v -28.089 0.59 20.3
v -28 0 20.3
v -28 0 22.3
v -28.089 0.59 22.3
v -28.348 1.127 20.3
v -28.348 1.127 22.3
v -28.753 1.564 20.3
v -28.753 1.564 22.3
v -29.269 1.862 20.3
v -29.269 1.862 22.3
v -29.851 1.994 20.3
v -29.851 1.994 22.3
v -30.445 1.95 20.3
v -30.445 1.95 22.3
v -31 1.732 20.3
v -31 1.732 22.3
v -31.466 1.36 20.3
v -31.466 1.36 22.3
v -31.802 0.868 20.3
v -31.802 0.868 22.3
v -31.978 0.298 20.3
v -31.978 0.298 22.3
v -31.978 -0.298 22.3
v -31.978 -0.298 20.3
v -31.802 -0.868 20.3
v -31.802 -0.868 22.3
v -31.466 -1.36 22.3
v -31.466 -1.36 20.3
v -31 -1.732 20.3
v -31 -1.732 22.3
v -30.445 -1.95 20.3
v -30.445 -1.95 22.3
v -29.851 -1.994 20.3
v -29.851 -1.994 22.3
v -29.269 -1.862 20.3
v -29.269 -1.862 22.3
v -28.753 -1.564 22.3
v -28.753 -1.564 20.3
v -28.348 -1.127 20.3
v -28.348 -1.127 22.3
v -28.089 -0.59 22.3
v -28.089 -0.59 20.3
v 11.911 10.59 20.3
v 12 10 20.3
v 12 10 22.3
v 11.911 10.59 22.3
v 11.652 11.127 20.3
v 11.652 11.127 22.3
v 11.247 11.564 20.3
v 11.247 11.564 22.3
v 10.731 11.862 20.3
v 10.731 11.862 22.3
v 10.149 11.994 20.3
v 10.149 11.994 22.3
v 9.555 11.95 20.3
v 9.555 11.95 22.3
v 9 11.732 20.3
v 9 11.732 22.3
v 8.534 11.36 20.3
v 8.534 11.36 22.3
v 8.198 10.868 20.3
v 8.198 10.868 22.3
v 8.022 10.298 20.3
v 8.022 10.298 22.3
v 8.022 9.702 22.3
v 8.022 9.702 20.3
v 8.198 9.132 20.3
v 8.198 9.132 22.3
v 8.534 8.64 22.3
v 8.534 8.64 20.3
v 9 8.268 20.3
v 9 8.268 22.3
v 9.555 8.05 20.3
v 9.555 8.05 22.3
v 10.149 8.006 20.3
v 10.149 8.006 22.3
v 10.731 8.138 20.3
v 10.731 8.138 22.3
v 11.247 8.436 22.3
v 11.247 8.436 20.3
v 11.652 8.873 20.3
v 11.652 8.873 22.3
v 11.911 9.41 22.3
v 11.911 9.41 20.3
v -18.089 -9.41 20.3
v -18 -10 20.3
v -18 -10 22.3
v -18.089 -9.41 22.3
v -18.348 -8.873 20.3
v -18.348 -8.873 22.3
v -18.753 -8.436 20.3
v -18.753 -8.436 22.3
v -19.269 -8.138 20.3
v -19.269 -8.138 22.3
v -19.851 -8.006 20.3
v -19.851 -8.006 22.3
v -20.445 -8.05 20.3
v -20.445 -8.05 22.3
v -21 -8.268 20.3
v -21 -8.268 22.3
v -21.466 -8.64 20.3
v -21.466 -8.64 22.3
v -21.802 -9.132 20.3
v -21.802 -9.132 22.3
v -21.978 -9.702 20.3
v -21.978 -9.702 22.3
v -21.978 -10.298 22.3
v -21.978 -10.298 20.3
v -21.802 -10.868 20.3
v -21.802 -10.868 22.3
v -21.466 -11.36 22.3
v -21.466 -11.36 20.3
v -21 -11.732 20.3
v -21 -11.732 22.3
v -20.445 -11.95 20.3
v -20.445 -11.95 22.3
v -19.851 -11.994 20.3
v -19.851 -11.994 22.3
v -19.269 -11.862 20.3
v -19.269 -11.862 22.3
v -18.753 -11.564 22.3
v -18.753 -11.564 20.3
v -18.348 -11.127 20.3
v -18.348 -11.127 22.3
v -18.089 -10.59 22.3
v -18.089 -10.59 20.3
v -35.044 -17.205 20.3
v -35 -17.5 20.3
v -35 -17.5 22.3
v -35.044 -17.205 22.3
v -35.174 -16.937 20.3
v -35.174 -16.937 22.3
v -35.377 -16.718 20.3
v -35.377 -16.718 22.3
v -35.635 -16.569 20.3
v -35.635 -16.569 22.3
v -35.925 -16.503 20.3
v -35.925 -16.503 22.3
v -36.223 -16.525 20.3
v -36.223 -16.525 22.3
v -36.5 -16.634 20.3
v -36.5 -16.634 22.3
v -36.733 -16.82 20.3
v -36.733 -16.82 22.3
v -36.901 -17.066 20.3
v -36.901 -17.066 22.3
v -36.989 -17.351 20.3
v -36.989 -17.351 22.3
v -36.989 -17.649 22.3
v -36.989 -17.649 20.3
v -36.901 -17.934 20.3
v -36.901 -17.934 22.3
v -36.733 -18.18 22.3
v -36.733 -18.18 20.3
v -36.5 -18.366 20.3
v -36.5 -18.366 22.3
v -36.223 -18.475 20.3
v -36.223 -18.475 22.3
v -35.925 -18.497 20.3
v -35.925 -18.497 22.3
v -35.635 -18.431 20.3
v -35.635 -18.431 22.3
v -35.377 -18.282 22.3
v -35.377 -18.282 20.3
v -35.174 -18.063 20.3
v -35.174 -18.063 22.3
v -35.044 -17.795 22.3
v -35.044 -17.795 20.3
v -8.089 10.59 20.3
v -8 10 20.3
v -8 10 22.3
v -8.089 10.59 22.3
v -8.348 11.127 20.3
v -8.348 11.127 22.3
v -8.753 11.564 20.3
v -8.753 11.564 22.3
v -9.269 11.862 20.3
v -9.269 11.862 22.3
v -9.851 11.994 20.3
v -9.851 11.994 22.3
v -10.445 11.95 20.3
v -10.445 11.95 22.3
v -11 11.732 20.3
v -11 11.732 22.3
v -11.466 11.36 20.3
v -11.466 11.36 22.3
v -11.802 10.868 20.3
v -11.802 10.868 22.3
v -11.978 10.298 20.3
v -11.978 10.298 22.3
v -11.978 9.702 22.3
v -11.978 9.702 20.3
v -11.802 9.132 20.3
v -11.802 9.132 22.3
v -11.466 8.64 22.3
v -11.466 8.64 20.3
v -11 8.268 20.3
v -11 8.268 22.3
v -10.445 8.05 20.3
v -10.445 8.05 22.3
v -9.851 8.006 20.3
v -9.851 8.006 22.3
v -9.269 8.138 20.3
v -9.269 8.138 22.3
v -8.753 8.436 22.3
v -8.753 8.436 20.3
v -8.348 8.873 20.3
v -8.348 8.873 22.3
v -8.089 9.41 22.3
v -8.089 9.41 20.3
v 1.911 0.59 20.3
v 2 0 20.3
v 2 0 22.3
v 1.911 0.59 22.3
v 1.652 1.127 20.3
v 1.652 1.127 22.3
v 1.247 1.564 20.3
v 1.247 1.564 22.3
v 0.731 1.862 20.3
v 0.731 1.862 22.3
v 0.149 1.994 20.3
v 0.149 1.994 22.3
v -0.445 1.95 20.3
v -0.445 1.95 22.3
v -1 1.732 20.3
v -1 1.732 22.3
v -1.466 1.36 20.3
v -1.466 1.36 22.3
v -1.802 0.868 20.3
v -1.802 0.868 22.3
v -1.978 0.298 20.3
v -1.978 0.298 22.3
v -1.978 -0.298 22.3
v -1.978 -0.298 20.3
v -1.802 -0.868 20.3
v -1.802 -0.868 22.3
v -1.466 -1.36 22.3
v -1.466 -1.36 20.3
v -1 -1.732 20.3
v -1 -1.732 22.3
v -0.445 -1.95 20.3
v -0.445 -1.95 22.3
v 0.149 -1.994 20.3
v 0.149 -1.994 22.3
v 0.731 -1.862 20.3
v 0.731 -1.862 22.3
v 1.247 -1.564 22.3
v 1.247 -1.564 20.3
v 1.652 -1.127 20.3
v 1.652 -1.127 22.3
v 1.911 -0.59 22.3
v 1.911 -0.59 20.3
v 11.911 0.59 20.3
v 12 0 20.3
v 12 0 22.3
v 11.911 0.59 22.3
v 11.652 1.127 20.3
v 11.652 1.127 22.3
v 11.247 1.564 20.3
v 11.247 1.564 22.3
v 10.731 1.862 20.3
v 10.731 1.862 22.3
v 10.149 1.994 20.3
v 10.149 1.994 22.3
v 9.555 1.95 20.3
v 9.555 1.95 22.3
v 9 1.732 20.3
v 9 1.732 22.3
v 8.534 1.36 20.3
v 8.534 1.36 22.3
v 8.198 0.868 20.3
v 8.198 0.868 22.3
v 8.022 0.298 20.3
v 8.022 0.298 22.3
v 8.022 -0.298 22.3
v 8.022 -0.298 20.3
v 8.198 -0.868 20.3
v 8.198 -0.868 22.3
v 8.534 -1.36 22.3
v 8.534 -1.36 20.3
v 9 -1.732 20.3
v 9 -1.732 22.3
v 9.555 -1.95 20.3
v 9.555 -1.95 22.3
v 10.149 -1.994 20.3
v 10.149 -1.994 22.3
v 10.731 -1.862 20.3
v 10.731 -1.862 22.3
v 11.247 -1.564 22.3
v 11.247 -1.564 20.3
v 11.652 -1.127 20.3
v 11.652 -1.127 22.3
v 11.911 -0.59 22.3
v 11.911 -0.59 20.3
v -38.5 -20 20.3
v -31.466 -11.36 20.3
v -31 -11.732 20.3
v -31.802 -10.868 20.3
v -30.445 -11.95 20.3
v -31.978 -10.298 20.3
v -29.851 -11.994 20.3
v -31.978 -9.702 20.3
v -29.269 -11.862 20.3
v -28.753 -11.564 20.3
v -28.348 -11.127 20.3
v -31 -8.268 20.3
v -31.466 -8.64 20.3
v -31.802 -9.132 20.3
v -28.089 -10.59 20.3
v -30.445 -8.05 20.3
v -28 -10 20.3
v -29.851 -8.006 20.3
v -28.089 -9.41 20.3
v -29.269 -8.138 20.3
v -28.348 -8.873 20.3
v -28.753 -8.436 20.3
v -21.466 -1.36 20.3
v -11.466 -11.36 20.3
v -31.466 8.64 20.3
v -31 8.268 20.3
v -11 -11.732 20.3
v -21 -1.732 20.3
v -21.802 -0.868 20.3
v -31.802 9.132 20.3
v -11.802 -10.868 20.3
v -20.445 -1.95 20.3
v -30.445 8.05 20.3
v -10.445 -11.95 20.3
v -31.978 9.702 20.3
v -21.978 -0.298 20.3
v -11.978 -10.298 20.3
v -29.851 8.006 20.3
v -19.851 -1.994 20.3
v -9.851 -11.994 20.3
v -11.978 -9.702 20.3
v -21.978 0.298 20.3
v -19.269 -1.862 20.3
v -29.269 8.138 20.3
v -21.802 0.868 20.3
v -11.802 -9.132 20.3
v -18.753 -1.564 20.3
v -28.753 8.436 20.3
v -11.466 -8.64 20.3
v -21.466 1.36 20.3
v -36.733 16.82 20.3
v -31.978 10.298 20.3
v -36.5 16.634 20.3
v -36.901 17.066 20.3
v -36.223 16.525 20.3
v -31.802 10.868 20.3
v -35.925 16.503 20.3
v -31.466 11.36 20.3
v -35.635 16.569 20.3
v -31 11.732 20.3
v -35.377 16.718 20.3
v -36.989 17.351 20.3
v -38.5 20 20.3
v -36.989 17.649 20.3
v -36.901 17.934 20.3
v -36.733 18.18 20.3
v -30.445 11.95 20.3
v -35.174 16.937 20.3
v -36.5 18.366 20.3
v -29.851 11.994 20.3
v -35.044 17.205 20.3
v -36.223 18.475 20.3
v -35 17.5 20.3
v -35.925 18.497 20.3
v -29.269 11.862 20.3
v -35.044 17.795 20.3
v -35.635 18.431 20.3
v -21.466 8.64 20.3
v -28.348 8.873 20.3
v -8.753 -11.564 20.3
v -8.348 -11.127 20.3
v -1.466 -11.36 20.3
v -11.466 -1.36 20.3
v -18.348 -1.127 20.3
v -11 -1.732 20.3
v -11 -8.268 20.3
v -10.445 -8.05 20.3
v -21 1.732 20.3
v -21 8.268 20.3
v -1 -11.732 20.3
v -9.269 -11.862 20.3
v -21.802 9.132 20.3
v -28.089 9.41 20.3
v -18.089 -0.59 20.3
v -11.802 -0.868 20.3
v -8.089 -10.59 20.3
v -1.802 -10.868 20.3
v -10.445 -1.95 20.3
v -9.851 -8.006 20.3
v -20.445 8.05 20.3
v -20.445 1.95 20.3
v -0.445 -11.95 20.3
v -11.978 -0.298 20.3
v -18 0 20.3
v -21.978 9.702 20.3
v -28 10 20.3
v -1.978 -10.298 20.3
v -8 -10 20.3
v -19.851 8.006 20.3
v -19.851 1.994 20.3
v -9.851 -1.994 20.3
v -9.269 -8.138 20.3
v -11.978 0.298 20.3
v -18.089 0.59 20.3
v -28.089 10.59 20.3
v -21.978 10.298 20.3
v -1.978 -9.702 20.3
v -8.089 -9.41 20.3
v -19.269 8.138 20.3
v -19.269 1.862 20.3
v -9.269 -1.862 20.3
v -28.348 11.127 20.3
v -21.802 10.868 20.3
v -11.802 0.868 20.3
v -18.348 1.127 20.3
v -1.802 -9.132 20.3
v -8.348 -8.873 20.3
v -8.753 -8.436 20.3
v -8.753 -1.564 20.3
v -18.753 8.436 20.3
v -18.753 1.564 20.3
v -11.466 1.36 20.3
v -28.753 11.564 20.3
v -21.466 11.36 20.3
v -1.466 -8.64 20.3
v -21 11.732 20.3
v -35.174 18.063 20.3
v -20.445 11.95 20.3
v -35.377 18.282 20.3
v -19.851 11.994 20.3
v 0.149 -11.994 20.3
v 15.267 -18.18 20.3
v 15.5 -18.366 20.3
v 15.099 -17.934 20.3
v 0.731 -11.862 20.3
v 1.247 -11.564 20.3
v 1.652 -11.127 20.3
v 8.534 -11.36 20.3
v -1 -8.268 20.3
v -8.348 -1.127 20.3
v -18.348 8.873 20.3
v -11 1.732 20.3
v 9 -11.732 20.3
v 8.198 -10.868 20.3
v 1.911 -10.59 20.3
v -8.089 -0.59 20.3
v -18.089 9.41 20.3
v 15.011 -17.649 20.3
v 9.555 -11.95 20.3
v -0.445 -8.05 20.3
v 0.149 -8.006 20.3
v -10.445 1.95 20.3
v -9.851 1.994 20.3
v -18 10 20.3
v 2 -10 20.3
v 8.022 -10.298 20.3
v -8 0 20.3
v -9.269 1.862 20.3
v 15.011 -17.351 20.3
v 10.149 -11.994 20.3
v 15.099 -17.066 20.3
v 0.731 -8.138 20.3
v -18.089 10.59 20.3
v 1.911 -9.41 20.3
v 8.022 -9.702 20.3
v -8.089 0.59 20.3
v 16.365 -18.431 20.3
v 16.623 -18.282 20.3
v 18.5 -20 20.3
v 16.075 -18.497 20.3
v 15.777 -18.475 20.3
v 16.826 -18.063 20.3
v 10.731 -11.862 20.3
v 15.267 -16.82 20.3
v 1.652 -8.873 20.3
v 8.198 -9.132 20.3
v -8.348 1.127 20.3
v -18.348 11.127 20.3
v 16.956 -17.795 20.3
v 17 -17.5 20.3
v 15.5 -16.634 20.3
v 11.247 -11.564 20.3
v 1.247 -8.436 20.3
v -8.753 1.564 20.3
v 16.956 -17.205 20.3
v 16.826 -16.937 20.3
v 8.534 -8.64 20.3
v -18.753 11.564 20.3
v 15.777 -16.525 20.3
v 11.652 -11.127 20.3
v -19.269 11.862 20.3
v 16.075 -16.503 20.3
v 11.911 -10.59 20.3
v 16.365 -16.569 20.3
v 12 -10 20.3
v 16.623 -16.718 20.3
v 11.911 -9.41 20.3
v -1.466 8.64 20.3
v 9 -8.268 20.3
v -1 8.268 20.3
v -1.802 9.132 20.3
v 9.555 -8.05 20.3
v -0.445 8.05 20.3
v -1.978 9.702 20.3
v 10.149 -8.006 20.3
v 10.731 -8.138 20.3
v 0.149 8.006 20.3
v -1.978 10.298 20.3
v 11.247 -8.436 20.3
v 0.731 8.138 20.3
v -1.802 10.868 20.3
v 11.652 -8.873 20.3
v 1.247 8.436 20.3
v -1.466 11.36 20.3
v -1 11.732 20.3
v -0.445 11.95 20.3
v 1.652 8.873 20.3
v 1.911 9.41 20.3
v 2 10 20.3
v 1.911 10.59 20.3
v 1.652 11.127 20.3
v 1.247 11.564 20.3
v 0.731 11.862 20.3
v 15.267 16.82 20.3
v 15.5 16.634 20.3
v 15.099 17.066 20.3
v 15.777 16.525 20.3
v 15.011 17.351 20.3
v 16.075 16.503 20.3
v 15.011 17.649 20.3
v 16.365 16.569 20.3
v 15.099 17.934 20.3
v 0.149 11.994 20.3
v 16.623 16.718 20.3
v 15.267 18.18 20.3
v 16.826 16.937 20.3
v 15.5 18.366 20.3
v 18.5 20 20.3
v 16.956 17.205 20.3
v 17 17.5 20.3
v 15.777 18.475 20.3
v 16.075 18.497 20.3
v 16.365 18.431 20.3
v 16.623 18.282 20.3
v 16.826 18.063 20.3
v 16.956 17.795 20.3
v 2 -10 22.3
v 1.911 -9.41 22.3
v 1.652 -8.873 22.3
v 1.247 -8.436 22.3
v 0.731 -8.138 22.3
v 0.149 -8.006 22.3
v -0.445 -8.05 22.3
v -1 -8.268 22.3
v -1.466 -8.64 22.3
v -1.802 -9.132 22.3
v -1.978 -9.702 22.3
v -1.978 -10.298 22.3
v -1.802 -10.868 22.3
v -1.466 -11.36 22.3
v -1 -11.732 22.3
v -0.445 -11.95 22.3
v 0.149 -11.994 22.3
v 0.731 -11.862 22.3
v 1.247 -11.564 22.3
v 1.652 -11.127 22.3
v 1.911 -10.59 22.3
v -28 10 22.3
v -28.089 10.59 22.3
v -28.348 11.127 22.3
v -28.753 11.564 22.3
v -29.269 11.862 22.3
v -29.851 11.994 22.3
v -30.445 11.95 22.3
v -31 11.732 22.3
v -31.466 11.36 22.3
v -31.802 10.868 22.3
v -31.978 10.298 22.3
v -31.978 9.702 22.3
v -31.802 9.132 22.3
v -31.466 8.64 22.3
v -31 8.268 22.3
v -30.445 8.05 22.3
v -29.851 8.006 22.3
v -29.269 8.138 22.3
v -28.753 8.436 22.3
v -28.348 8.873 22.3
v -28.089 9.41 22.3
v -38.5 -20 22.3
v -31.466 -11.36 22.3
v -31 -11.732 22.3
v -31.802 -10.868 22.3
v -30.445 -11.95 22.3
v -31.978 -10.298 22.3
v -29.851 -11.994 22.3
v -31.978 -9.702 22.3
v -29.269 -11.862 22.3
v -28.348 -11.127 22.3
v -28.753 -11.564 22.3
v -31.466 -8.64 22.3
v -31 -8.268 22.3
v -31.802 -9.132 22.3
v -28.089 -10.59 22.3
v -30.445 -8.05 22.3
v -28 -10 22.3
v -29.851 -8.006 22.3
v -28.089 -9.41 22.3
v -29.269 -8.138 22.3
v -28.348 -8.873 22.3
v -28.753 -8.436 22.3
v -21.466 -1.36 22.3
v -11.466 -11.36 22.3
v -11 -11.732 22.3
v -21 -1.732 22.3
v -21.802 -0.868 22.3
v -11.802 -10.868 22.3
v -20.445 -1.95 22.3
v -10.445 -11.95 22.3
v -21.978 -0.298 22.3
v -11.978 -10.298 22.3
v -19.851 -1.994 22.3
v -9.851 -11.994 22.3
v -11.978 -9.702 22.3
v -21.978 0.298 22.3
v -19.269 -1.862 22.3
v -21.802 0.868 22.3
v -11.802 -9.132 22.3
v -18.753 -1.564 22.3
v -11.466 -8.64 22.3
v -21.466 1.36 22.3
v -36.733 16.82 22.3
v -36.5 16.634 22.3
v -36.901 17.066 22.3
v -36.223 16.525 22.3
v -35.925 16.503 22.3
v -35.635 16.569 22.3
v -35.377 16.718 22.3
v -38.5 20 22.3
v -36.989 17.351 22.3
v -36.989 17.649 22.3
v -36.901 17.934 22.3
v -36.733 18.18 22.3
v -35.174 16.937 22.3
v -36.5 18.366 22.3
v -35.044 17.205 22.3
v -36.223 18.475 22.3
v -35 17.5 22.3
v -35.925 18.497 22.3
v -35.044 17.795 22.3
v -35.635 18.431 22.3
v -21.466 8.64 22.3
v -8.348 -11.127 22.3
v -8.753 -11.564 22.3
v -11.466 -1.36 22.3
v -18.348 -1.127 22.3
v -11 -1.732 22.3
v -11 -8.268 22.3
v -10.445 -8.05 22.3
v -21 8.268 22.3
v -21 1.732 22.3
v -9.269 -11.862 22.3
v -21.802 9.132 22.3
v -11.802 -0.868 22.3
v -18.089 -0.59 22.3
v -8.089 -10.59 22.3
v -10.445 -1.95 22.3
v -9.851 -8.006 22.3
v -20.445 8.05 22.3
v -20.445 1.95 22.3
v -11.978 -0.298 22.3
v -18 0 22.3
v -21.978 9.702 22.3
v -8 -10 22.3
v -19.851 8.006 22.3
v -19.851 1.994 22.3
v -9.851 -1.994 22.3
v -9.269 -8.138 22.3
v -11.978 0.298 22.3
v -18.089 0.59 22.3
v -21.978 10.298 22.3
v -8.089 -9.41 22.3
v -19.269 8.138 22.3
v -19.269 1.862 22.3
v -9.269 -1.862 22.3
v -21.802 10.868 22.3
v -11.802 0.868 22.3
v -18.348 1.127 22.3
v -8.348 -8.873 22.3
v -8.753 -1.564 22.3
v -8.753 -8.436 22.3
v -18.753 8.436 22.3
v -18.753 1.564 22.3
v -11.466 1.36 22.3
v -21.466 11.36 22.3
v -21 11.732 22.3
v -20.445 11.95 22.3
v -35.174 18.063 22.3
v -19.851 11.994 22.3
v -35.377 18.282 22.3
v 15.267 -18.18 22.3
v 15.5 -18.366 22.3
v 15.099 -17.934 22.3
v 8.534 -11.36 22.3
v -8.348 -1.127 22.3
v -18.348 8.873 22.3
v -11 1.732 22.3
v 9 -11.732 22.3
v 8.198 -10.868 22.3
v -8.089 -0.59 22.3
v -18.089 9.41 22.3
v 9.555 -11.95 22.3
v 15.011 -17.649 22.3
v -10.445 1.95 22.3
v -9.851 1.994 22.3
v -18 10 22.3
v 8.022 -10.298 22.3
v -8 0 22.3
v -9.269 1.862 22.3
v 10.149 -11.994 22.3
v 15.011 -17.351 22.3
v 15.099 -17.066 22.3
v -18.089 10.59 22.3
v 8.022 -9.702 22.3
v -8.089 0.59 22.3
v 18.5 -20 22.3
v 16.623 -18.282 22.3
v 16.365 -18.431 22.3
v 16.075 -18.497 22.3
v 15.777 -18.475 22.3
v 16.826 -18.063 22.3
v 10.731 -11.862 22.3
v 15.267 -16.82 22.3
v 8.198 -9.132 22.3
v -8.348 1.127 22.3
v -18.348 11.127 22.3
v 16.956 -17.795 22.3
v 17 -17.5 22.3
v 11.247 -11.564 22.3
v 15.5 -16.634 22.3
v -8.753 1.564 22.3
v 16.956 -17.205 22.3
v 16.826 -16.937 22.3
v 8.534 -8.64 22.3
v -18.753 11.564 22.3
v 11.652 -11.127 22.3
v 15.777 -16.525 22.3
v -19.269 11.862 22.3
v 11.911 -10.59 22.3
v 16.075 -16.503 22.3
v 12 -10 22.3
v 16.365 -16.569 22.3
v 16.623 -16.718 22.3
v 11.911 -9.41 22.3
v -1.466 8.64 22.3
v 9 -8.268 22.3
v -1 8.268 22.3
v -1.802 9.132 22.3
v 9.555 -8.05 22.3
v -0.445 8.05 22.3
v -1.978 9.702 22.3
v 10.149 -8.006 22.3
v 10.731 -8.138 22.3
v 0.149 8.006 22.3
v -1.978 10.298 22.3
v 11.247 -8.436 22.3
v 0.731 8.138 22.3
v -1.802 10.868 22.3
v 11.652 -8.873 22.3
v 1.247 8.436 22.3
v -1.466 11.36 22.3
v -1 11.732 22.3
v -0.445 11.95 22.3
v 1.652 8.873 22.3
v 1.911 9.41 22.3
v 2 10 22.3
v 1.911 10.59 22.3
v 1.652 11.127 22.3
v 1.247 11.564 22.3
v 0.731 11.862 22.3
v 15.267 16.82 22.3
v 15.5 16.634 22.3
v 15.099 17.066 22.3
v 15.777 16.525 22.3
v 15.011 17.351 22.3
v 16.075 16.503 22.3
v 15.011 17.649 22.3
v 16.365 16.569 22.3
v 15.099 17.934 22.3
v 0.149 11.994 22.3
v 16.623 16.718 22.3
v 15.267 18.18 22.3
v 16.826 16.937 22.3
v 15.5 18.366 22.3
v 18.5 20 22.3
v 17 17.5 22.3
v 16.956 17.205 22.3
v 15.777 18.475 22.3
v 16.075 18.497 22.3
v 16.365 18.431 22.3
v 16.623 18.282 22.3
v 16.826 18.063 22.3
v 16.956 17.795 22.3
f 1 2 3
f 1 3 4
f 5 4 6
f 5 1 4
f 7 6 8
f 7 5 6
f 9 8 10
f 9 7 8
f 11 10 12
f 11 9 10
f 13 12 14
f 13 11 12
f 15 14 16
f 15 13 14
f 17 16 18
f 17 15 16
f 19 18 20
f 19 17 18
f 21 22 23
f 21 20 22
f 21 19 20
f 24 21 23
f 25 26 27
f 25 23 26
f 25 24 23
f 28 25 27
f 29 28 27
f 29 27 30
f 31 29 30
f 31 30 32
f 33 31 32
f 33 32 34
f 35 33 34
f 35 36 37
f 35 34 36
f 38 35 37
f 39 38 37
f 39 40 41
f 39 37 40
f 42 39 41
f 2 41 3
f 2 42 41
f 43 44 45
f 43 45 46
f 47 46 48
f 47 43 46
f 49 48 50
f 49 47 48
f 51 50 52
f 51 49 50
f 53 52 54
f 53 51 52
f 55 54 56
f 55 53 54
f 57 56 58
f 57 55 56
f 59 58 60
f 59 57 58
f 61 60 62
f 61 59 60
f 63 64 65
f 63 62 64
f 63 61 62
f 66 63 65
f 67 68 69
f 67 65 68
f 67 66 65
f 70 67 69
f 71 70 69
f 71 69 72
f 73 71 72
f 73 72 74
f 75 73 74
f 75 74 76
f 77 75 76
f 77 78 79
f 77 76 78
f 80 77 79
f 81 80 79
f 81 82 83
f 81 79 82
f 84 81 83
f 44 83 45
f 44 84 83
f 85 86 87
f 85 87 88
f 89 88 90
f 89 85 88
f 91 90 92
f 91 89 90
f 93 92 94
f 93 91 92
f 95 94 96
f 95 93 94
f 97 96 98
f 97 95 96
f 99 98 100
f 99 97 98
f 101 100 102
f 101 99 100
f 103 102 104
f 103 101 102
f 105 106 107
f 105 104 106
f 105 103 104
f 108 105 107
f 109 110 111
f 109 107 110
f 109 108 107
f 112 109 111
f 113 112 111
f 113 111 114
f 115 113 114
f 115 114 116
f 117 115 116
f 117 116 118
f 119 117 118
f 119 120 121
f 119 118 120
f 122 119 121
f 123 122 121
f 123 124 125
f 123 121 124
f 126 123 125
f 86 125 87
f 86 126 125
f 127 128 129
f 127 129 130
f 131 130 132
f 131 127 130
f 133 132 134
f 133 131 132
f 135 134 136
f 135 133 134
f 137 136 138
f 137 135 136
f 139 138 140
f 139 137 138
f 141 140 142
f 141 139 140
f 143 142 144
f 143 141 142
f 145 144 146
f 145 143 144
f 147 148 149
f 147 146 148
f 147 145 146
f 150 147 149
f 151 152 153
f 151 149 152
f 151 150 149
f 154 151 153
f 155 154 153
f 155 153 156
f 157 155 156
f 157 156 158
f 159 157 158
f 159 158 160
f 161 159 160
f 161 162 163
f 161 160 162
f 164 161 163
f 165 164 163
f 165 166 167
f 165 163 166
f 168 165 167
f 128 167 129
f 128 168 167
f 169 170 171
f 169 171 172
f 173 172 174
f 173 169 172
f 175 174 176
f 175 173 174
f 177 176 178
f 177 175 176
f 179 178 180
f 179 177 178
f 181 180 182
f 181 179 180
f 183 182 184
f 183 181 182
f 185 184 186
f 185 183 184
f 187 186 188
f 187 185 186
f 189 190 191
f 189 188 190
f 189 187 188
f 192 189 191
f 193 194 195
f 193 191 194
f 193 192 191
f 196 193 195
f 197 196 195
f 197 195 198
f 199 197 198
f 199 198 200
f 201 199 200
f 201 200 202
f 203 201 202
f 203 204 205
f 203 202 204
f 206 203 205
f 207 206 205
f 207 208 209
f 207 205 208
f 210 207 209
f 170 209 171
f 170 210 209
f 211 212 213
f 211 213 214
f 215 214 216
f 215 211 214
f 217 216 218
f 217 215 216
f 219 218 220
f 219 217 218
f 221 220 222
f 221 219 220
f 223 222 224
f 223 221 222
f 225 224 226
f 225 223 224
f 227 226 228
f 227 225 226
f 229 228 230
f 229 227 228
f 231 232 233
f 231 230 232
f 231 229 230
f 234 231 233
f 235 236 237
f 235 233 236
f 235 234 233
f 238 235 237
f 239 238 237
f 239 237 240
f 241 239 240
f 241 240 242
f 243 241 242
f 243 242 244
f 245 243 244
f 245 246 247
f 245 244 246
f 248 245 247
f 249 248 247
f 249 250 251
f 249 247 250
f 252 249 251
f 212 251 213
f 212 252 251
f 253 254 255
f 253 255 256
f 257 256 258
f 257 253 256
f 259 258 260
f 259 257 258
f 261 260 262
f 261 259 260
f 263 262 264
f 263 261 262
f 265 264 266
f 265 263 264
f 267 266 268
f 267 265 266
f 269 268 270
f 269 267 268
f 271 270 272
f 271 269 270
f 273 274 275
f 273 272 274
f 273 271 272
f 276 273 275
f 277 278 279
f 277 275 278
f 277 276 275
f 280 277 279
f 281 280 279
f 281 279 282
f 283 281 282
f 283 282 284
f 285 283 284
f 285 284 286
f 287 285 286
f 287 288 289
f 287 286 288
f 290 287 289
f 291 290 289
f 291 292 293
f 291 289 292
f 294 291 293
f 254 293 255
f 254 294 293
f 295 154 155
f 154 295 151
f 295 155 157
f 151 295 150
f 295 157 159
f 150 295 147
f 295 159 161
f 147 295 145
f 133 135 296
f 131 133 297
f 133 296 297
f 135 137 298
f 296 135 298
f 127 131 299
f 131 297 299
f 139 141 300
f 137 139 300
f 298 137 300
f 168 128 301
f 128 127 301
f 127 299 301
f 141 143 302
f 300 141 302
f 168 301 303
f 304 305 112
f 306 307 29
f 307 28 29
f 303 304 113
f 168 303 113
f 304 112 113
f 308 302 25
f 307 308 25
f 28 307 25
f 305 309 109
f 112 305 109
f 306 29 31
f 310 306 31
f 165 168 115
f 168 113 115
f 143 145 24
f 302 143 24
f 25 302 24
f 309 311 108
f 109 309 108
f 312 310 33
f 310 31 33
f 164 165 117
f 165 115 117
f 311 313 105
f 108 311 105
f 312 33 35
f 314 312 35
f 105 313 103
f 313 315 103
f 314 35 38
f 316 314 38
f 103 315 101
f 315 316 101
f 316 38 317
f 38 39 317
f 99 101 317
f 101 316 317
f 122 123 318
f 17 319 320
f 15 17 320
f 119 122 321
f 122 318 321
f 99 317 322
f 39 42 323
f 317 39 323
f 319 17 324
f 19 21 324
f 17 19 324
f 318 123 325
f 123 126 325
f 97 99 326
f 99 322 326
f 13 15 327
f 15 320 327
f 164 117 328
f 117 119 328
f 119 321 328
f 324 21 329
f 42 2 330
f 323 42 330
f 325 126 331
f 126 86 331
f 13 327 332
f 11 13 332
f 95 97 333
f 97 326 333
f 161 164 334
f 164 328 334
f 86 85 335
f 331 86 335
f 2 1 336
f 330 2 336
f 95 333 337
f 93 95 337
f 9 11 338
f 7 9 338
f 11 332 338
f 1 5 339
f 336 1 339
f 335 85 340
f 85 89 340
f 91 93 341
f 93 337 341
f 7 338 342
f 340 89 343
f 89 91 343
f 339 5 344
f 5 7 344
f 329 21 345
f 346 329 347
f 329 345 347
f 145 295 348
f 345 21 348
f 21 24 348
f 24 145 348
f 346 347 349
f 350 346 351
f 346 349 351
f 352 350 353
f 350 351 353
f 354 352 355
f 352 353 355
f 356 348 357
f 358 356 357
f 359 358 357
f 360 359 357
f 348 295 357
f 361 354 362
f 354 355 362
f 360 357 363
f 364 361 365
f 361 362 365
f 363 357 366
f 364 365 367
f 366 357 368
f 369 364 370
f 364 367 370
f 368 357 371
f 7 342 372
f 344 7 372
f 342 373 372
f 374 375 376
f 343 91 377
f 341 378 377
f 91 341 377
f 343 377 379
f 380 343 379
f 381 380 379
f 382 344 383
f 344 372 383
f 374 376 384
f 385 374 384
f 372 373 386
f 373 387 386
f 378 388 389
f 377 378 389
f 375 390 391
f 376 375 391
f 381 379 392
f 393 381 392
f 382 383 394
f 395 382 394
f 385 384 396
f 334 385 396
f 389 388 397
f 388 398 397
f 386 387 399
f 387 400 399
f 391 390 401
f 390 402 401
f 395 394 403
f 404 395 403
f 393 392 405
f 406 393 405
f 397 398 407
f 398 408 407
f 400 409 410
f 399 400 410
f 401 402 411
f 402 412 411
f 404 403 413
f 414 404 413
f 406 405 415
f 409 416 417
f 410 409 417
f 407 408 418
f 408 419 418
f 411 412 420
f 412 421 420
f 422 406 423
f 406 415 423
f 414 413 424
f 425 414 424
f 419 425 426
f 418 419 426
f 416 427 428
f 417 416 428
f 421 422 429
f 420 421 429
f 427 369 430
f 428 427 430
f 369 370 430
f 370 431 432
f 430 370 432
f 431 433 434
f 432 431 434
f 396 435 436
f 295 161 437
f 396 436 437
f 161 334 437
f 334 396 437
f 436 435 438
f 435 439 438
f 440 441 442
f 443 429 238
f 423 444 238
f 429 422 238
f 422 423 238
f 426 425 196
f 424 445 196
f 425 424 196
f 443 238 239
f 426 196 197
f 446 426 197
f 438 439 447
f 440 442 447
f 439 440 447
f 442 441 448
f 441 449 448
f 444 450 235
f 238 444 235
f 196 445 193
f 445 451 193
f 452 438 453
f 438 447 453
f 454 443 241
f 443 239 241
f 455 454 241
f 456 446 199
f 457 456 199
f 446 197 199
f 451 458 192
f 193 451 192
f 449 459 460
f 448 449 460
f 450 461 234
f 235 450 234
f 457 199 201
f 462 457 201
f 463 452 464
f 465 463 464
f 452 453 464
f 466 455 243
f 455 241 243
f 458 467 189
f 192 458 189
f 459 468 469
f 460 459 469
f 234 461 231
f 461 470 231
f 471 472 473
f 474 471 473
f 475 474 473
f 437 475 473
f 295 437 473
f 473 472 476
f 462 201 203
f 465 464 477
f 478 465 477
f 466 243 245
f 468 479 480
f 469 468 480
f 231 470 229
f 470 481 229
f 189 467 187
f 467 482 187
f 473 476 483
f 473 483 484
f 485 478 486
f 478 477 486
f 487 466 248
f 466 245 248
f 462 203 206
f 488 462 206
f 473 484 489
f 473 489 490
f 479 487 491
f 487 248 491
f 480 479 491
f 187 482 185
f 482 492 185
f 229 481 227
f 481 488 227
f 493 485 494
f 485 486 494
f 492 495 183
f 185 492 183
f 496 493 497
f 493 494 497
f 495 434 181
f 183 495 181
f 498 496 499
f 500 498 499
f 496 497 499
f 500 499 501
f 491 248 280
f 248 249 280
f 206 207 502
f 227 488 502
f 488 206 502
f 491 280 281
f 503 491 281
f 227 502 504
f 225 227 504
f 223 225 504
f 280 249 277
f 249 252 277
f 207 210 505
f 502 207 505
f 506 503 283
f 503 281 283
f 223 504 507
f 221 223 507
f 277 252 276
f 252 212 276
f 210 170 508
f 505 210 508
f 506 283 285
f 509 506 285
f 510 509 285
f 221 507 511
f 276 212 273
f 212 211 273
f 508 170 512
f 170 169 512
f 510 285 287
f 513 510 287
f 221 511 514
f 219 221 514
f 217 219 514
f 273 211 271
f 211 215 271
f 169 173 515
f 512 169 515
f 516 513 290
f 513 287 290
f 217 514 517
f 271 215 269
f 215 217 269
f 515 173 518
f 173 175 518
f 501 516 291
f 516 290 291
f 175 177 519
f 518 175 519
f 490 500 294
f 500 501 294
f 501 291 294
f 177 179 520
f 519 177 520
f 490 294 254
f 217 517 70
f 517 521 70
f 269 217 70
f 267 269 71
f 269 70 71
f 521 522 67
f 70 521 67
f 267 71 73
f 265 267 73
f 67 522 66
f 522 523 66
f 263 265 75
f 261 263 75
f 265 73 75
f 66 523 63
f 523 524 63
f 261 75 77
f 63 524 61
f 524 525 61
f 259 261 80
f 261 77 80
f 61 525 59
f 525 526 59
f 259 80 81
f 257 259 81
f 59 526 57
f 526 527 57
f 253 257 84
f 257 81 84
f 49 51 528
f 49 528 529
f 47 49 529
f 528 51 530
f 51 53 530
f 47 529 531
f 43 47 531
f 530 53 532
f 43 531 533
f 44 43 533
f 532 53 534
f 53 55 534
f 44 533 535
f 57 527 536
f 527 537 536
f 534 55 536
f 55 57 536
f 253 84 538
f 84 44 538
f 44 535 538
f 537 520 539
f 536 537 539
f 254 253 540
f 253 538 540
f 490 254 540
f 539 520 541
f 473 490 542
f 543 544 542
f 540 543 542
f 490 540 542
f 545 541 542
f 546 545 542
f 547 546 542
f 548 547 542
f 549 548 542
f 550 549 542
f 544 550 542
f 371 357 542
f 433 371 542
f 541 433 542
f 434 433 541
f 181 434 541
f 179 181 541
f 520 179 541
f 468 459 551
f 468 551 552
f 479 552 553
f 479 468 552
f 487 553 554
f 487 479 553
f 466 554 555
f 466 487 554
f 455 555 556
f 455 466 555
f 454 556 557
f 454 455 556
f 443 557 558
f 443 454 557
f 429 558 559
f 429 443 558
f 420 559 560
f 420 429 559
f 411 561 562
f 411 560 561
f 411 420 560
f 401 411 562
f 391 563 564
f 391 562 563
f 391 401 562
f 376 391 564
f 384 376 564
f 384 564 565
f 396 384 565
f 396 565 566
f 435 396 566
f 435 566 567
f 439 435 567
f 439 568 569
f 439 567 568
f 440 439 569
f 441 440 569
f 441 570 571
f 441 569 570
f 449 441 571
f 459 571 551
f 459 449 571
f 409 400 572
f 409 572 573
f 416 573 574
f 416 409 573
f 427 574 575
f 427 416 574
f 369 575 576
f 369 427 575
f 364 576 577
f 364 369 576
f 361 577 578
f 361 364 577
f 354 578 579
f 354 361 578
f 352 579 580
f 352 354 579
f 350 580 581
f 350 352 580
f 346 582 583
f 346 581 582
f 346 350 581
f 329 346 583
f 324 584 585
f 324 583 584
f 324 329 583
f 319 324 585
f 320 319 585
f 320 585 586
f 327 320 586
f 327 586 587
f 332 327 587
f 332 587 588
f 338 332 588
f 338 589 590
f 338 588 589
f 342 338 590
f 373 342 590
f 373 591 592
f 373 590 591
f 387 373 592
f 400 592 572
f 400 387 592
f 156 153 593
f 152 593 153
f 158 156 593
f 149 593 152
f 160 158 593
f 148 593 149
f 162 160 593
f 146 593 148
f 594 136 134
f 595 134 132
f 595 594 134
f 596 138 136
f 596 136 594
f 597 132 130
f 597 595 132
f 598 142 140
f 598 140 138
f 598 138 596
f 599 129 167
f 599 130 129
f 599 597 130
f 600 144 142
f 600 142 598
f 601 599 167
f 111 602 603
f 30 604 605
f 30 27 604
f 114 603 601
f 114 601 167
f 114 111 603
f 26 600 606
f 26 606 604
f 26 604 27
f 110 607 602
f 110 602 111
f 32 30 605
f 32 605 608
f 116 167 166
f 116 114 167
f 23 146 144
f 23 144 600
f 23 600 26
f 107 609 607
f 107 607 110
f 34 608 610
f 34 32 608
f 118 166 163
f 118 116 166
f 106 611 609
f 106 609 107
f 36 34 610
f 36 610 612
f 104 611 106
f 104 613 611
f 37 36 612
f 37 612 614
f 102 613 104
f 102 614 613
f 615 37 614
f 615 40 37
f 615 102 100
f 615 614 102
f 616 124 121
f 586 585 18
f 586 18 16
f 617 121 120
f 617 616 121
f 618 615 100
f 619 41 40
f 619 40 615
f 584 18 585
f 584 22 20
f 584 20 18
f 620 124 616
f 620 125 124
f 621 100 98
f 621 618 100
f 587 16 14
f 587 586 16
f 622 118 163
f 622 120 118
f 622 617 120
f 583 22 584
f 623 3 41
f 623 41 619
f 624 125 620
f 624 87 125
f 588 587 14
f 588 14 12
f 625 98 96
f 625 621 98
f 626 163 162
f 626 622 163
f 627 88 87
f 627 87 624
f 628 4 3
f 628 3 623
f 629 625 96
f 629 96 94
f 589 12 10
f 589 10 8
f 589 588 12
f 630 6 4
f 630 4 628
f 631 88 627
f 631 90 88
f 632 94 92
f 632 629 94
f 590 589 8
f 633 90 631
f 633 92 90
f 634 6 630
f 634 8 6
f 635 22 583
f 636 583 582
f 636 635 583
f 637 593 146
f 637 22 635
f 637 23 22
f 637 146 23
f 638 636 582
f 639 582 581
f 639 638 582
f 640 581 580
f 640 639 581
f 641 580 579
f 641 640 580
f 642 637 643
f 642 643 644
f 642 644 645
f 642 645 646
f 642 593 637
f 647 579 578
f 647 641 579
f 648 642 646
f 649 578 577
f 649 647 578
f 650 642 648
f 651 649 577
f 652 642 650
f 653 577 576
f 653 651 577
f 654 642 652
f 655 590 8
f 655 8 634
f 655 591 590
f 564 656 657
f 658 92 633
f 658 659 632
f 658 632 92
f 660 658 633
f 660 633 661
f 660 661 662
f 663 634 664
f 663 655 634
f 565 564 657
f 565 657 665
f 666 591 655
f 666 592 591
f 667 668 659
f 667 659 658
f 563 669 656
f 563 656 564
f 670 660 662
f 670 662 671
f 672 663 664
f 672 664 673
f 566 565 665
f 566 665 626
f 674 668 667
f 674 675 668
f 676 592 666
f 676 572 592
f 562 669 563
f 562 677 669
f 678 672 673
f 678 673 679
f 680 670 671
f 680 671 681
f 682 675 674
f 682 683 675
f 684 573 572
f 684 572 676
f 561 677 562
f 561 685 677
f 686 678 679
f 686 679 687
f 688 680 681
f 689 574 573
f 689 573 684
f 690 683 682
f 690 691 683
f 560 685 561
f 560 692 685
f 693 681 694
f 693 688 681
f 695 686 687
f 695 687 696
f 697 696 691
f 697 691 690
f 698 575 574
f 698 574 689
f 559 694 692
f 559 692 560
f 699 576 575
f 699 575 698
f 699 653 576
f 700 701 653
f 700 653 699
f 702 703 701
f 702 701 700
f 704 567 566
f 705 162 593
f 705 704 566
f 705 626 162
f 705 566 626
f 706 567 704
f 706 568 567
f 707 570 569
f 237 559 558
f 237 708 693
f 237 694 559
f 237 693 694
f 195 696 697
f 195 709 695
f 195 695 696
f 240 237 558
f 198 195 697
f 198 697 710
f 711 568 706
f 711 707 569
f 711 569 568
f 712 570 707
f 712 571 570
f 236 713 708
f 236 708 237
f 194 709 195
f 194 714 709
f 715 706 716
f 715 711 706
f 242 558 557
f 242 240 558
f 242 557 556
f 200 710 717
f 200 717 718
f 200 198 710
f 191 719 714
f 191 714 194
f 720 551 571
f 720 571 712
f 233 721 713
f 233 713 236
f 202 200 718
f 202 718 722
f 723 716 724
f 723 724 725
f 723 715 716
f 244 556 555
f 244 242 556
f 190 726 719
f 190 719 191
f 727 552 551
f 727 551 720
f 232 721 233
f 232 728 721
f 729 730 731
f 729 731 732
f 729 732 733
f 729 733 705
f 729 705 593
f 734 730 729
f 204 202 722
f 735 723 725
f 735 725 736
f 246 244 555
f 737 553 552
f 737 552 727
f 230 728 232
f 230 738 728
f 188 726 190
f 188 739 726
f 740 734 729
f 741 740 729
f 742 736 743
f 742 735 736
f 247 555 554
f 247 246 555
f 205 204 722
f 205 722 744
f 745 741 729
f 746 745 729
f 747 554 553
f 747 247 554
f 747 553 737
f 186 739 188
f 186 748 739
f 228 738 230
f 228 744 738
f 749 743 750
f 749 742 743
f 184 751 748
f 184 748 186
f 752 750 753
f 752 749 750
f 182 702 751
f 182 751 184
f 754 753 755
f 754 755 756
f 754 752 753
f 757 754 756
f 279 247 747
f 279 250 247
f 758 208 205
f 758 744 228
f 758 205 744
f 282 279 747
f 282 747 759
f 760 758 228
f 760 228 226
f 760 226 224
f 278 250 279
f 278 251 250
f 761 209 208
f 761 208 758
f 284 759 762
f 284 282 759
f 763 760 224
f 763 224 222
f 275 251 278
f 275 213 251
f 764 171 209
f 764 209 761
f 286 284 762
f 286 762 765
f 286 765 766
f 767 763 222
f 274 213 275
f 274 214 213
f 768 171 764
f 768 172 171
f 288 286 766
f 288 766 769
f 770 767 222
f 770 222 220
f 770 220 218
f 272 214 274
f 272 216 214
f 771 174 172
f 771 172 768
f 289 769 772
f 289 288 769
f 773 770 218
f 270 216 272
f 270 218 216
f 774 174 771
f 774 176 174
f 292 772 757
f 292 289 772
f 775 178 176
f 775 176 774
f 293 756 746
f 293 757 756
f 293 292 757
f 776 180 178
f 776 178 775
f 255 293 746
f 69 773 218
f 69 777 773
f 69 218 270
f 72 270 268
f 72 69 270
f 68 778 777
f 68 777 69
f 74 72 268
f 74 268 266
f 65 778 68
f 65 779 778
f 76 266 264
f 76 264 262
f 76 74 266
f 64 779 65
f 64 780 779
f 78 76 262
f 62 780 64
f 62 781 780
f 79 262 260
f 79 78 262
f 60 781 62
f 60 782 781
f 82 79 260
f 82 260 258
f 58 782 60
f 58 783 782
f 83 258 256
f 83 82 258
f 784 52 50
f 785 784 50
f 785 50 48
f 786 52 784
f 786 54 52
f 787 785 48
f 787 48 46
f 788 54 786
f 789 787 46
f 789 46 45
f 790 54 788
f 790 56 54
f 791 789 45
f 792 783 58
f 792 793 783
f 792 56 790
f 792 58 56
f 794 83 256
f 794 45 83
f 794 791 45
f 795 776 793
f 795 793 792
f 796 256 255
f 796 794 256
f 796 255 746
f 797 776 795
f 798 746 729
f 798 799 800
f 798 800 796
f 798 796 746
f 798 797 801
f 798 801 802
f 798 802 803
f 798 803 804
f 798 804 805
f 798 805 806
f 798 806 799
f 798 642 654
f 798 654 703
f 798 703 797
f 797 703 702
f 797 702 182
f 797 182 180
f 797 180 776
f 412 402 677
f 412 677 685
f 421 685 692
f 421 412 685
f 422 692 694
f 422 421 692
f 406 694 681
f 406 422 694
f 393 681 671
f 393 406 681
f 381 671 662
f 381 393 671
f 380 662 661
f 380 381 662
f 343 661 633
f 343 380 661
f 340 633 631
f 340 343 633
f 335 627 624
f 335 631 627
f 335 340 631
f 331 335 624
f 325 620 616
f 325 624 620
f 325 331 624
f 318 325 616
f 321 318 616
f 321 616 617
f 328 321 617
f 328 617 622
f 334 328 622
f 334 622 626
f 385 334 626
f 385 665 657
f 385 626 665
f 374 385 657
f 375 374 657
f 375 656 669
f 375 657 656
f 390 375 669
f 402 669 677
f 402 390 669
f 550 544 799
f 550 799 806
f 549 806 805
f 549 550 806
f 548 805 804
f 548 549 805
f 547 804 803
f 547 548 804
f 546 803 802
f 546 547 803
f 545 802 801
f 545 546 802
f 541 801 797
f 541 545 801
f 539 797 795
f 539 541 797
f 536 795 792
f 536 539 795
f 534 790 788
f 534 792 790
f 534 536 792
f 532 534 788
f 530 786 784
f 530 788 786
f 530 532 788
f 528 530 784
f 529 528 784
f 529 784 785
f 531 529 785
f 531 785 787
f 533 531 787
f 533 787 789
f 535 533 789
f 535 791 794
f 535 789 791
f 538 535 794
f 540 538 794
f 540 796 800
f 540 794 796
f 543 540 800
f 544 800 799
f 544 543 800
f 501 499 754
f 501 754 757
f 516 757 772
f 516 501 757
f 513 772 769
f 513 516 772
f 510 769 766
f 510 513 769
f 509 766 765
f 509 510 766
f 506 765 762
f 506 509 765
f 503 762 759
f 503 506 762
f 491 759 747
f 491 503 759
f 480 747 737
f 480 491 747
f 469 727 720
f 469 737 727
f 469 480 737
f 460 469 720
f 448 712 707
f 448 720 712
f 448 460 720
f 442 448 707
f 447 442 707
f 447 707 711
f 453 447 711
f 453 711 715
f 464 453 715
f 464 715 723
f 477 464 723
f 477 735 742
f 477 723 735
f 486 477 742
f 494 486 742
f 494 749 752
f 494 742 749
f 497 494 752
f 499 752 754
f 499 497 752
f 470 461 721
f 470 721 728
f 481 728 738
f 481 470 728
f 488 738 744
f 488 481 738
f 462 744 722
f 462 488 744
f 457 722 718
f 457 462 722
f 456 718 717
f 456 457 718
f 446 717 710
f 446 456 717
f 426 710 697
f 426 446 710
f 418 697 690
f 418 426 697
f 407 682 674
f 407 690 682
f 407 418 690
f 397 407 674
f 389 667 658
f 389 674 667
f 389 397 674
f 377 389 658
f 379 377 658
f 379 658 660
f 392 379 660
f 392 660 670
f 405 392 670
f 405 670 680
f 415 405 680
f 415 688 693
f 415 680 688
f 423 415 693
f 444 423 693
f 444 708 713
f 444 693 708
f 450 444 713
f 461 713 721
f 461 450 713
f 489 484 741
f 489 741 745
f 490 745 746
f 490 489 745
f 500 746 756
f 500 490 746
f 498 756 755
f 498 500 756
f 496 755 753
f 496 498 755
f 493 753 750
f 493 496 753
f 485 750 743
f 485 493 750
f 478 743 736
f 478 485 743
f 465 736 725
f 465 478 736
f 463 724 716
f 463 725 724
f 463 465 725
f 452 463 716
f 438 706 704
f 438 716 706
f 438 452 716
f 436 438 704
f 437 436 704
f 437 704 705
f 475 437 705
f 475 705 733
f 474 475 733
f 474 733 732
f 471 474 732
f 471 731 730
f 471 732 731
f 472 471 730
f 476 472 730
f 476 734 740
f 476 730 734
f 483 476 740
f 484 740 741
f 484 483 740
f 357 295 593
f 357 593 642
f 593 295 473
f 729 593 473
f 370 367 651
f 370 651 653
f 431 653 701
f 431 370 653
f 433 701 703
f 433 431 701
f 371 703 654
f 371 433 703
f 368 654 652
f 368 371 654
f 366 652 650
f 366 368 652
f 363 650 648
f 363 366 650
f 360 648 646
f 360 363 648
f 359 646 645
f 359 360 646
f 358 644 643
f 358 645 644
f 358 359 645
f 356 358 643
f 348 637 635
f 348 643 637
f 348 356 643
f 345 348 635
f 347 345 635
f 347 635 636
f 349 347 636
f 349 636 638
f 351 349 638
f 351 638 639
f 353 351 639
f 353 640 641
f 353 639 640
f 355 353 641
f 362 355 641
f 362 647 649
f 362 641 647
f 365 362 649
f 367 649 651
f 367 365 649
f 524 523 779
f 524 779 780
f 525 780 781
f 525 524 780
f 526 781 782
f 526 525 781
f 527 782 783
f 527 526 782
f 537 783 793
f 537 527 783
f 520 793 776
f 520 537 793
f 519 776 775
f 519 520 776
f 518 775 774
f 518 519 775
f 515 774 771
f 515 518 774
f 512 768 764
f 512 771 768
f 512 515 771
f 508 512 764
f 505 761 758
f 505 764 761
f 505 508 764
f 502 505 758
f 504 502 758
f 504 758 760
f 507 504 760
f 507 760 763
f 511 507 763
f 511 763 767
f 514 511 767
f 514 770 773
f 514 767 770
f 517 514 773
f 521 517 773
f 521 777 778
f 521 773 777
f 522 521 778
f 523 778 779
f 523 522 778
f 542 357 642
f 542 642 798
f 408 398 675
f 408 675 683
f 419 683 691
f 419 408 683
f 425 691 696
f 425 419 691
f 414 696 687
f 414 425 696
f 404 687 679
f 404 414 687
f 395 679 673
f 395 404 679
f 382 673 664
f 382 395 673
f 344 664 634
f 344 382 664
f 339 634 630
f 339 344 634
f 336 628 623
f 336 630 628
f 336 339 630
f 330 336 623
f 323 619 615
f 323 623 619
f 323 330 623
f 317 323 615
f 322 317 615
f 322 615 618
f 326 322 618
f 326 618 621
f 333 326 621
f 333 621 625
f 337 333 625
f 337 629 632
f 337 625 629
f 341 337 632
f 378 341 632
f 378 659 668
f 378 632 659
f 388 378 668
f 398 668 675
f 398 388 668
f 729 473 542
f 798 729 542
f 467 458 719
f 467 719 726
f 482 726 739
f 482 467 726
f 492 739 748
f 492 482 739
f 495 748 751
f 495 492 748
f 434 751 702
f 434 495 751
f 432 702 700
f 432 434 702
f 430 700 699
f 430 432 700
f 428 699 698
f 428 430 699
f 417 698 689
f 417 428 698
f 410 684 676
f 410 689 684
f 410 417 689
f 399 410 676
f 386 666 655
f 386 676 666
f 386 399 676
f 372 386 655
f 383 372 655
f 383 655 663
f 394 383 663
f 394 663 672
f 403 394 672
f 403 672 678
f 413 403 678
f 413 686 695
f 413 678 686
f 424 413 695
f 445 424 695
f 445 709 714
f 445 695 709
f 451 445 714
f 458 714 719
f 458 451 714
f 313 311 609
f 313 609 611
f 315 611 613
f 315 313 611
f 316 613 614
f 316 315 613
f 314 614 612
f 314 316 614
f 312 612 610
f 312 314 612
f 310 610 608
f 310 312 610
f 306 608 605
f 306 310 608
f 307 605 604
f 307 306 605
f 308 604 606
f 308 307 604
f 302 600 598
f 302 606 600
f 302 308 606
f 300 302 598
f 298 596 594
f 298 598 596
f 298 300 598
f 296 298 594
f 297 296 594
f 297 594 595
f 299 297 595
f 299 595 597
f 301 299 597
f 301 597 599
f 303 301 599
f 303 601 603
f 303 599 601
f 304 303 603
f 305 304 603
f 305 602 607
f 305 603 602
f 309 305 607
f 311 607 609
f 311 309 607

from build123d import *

# Parameters (mm, degrees)
CYLINDER002_R     = 2
CYLINDER002_DEPTH = 10
ARRAY002_X_COUNT  = 5
ARRAY002_X_PITCH  = 10
ARRAY002_Y_COUNT  = 3
ARRAY002_Y_PITCH  = 10
CYLINDER001_R     = 1
CYLINDER001_DEPTH = 10
ARRAY001_X_COUNT  = 2
ARRAY001_X_PITCH  = 52
ARRAY001_Y_COUNT  = 2
ARRAY001_Y_PITCH  = 35
BOX_W             = 57
BOX_H             = 40
BOX_DEPTH         = 2


with BuildPart() as array002:
    # Cylinder002 → Cylinder002 (new body)
    with BuildSketch(Plane(origin=(-30, -10, 17), x_dir=(1, 0, 0), z_dir=(0, 0, 1))):
        Circle(CYLINDER002_R)
    extrude(amount=CYLINDER002_DEPTH)

    # Array002 X: Array002 ×5


with BuildPart() as array002_1:
    add(array002.part)
    with Locations(*[(i * ARRAY002_X_PITCH, 0, 0) for i in range(1, ARRAY002_X_COUNT)]):
        add(array002.part)

    # Array002 Y: Array002 ×3


with BuildPart() as array002_2:
    add(array002_1.part)
    with Locations(*[(0, i * ARRAY002_Y_PITCH, 0) for i in range(1, ARRAY002_Y_COUNT)]):
        add(array002_1.part)


with BuildPart() as array001:
    # Cylinder001 → Cylinder001 (new body)
    with BuildSketch(Plane(origin=(-36, -17.5, 18), x_dir=(1, 0, 0), z_dir=(0, 0, 1))):
        Circle(CYLINDER001_R)
    extrude(amount=CYLINDER001_DEPTH)

    # Array001 X: Array001 ×2


with BuildPart() as array001_1:
    add(array001.part)
    with Locations(*[(i * ARRAY001_X_PITCH, 0, 0) for i in range(1, ARRAY001_X_COUNT)]):
        add(array001.part)

    # Array001 Y: Array001 ×2


with BuildPart() as array001_2:
    add(array001_1.part)
    with Locations(*[(0, i * ARRAY001_Y_PITCH, 0) for i in range(1, ARRAY001_Y_COUNT)]):
        add(array001_1.part)


with BuildPart() as top_cut:
    # Box → Box (new body)
    with BuildSketch(Plane(origin=(-38.5, -20, 20.3), x_dir=(1, 0, 0), z_dir=(0, 0, 1))):
        with Locations((28.5, 20)):
            Rectangle(BOX_W, BOX_H)
    extrude(amount=BOX_DEPTH)

    # Cut003: cut Array001
    add(array001_2.part, mode=Mode.SUBTRACT)

    # Cut004: cut Array002
    add(array002_2.part, mode=Mode.SUBTRACT)


solid = top_cut.part
